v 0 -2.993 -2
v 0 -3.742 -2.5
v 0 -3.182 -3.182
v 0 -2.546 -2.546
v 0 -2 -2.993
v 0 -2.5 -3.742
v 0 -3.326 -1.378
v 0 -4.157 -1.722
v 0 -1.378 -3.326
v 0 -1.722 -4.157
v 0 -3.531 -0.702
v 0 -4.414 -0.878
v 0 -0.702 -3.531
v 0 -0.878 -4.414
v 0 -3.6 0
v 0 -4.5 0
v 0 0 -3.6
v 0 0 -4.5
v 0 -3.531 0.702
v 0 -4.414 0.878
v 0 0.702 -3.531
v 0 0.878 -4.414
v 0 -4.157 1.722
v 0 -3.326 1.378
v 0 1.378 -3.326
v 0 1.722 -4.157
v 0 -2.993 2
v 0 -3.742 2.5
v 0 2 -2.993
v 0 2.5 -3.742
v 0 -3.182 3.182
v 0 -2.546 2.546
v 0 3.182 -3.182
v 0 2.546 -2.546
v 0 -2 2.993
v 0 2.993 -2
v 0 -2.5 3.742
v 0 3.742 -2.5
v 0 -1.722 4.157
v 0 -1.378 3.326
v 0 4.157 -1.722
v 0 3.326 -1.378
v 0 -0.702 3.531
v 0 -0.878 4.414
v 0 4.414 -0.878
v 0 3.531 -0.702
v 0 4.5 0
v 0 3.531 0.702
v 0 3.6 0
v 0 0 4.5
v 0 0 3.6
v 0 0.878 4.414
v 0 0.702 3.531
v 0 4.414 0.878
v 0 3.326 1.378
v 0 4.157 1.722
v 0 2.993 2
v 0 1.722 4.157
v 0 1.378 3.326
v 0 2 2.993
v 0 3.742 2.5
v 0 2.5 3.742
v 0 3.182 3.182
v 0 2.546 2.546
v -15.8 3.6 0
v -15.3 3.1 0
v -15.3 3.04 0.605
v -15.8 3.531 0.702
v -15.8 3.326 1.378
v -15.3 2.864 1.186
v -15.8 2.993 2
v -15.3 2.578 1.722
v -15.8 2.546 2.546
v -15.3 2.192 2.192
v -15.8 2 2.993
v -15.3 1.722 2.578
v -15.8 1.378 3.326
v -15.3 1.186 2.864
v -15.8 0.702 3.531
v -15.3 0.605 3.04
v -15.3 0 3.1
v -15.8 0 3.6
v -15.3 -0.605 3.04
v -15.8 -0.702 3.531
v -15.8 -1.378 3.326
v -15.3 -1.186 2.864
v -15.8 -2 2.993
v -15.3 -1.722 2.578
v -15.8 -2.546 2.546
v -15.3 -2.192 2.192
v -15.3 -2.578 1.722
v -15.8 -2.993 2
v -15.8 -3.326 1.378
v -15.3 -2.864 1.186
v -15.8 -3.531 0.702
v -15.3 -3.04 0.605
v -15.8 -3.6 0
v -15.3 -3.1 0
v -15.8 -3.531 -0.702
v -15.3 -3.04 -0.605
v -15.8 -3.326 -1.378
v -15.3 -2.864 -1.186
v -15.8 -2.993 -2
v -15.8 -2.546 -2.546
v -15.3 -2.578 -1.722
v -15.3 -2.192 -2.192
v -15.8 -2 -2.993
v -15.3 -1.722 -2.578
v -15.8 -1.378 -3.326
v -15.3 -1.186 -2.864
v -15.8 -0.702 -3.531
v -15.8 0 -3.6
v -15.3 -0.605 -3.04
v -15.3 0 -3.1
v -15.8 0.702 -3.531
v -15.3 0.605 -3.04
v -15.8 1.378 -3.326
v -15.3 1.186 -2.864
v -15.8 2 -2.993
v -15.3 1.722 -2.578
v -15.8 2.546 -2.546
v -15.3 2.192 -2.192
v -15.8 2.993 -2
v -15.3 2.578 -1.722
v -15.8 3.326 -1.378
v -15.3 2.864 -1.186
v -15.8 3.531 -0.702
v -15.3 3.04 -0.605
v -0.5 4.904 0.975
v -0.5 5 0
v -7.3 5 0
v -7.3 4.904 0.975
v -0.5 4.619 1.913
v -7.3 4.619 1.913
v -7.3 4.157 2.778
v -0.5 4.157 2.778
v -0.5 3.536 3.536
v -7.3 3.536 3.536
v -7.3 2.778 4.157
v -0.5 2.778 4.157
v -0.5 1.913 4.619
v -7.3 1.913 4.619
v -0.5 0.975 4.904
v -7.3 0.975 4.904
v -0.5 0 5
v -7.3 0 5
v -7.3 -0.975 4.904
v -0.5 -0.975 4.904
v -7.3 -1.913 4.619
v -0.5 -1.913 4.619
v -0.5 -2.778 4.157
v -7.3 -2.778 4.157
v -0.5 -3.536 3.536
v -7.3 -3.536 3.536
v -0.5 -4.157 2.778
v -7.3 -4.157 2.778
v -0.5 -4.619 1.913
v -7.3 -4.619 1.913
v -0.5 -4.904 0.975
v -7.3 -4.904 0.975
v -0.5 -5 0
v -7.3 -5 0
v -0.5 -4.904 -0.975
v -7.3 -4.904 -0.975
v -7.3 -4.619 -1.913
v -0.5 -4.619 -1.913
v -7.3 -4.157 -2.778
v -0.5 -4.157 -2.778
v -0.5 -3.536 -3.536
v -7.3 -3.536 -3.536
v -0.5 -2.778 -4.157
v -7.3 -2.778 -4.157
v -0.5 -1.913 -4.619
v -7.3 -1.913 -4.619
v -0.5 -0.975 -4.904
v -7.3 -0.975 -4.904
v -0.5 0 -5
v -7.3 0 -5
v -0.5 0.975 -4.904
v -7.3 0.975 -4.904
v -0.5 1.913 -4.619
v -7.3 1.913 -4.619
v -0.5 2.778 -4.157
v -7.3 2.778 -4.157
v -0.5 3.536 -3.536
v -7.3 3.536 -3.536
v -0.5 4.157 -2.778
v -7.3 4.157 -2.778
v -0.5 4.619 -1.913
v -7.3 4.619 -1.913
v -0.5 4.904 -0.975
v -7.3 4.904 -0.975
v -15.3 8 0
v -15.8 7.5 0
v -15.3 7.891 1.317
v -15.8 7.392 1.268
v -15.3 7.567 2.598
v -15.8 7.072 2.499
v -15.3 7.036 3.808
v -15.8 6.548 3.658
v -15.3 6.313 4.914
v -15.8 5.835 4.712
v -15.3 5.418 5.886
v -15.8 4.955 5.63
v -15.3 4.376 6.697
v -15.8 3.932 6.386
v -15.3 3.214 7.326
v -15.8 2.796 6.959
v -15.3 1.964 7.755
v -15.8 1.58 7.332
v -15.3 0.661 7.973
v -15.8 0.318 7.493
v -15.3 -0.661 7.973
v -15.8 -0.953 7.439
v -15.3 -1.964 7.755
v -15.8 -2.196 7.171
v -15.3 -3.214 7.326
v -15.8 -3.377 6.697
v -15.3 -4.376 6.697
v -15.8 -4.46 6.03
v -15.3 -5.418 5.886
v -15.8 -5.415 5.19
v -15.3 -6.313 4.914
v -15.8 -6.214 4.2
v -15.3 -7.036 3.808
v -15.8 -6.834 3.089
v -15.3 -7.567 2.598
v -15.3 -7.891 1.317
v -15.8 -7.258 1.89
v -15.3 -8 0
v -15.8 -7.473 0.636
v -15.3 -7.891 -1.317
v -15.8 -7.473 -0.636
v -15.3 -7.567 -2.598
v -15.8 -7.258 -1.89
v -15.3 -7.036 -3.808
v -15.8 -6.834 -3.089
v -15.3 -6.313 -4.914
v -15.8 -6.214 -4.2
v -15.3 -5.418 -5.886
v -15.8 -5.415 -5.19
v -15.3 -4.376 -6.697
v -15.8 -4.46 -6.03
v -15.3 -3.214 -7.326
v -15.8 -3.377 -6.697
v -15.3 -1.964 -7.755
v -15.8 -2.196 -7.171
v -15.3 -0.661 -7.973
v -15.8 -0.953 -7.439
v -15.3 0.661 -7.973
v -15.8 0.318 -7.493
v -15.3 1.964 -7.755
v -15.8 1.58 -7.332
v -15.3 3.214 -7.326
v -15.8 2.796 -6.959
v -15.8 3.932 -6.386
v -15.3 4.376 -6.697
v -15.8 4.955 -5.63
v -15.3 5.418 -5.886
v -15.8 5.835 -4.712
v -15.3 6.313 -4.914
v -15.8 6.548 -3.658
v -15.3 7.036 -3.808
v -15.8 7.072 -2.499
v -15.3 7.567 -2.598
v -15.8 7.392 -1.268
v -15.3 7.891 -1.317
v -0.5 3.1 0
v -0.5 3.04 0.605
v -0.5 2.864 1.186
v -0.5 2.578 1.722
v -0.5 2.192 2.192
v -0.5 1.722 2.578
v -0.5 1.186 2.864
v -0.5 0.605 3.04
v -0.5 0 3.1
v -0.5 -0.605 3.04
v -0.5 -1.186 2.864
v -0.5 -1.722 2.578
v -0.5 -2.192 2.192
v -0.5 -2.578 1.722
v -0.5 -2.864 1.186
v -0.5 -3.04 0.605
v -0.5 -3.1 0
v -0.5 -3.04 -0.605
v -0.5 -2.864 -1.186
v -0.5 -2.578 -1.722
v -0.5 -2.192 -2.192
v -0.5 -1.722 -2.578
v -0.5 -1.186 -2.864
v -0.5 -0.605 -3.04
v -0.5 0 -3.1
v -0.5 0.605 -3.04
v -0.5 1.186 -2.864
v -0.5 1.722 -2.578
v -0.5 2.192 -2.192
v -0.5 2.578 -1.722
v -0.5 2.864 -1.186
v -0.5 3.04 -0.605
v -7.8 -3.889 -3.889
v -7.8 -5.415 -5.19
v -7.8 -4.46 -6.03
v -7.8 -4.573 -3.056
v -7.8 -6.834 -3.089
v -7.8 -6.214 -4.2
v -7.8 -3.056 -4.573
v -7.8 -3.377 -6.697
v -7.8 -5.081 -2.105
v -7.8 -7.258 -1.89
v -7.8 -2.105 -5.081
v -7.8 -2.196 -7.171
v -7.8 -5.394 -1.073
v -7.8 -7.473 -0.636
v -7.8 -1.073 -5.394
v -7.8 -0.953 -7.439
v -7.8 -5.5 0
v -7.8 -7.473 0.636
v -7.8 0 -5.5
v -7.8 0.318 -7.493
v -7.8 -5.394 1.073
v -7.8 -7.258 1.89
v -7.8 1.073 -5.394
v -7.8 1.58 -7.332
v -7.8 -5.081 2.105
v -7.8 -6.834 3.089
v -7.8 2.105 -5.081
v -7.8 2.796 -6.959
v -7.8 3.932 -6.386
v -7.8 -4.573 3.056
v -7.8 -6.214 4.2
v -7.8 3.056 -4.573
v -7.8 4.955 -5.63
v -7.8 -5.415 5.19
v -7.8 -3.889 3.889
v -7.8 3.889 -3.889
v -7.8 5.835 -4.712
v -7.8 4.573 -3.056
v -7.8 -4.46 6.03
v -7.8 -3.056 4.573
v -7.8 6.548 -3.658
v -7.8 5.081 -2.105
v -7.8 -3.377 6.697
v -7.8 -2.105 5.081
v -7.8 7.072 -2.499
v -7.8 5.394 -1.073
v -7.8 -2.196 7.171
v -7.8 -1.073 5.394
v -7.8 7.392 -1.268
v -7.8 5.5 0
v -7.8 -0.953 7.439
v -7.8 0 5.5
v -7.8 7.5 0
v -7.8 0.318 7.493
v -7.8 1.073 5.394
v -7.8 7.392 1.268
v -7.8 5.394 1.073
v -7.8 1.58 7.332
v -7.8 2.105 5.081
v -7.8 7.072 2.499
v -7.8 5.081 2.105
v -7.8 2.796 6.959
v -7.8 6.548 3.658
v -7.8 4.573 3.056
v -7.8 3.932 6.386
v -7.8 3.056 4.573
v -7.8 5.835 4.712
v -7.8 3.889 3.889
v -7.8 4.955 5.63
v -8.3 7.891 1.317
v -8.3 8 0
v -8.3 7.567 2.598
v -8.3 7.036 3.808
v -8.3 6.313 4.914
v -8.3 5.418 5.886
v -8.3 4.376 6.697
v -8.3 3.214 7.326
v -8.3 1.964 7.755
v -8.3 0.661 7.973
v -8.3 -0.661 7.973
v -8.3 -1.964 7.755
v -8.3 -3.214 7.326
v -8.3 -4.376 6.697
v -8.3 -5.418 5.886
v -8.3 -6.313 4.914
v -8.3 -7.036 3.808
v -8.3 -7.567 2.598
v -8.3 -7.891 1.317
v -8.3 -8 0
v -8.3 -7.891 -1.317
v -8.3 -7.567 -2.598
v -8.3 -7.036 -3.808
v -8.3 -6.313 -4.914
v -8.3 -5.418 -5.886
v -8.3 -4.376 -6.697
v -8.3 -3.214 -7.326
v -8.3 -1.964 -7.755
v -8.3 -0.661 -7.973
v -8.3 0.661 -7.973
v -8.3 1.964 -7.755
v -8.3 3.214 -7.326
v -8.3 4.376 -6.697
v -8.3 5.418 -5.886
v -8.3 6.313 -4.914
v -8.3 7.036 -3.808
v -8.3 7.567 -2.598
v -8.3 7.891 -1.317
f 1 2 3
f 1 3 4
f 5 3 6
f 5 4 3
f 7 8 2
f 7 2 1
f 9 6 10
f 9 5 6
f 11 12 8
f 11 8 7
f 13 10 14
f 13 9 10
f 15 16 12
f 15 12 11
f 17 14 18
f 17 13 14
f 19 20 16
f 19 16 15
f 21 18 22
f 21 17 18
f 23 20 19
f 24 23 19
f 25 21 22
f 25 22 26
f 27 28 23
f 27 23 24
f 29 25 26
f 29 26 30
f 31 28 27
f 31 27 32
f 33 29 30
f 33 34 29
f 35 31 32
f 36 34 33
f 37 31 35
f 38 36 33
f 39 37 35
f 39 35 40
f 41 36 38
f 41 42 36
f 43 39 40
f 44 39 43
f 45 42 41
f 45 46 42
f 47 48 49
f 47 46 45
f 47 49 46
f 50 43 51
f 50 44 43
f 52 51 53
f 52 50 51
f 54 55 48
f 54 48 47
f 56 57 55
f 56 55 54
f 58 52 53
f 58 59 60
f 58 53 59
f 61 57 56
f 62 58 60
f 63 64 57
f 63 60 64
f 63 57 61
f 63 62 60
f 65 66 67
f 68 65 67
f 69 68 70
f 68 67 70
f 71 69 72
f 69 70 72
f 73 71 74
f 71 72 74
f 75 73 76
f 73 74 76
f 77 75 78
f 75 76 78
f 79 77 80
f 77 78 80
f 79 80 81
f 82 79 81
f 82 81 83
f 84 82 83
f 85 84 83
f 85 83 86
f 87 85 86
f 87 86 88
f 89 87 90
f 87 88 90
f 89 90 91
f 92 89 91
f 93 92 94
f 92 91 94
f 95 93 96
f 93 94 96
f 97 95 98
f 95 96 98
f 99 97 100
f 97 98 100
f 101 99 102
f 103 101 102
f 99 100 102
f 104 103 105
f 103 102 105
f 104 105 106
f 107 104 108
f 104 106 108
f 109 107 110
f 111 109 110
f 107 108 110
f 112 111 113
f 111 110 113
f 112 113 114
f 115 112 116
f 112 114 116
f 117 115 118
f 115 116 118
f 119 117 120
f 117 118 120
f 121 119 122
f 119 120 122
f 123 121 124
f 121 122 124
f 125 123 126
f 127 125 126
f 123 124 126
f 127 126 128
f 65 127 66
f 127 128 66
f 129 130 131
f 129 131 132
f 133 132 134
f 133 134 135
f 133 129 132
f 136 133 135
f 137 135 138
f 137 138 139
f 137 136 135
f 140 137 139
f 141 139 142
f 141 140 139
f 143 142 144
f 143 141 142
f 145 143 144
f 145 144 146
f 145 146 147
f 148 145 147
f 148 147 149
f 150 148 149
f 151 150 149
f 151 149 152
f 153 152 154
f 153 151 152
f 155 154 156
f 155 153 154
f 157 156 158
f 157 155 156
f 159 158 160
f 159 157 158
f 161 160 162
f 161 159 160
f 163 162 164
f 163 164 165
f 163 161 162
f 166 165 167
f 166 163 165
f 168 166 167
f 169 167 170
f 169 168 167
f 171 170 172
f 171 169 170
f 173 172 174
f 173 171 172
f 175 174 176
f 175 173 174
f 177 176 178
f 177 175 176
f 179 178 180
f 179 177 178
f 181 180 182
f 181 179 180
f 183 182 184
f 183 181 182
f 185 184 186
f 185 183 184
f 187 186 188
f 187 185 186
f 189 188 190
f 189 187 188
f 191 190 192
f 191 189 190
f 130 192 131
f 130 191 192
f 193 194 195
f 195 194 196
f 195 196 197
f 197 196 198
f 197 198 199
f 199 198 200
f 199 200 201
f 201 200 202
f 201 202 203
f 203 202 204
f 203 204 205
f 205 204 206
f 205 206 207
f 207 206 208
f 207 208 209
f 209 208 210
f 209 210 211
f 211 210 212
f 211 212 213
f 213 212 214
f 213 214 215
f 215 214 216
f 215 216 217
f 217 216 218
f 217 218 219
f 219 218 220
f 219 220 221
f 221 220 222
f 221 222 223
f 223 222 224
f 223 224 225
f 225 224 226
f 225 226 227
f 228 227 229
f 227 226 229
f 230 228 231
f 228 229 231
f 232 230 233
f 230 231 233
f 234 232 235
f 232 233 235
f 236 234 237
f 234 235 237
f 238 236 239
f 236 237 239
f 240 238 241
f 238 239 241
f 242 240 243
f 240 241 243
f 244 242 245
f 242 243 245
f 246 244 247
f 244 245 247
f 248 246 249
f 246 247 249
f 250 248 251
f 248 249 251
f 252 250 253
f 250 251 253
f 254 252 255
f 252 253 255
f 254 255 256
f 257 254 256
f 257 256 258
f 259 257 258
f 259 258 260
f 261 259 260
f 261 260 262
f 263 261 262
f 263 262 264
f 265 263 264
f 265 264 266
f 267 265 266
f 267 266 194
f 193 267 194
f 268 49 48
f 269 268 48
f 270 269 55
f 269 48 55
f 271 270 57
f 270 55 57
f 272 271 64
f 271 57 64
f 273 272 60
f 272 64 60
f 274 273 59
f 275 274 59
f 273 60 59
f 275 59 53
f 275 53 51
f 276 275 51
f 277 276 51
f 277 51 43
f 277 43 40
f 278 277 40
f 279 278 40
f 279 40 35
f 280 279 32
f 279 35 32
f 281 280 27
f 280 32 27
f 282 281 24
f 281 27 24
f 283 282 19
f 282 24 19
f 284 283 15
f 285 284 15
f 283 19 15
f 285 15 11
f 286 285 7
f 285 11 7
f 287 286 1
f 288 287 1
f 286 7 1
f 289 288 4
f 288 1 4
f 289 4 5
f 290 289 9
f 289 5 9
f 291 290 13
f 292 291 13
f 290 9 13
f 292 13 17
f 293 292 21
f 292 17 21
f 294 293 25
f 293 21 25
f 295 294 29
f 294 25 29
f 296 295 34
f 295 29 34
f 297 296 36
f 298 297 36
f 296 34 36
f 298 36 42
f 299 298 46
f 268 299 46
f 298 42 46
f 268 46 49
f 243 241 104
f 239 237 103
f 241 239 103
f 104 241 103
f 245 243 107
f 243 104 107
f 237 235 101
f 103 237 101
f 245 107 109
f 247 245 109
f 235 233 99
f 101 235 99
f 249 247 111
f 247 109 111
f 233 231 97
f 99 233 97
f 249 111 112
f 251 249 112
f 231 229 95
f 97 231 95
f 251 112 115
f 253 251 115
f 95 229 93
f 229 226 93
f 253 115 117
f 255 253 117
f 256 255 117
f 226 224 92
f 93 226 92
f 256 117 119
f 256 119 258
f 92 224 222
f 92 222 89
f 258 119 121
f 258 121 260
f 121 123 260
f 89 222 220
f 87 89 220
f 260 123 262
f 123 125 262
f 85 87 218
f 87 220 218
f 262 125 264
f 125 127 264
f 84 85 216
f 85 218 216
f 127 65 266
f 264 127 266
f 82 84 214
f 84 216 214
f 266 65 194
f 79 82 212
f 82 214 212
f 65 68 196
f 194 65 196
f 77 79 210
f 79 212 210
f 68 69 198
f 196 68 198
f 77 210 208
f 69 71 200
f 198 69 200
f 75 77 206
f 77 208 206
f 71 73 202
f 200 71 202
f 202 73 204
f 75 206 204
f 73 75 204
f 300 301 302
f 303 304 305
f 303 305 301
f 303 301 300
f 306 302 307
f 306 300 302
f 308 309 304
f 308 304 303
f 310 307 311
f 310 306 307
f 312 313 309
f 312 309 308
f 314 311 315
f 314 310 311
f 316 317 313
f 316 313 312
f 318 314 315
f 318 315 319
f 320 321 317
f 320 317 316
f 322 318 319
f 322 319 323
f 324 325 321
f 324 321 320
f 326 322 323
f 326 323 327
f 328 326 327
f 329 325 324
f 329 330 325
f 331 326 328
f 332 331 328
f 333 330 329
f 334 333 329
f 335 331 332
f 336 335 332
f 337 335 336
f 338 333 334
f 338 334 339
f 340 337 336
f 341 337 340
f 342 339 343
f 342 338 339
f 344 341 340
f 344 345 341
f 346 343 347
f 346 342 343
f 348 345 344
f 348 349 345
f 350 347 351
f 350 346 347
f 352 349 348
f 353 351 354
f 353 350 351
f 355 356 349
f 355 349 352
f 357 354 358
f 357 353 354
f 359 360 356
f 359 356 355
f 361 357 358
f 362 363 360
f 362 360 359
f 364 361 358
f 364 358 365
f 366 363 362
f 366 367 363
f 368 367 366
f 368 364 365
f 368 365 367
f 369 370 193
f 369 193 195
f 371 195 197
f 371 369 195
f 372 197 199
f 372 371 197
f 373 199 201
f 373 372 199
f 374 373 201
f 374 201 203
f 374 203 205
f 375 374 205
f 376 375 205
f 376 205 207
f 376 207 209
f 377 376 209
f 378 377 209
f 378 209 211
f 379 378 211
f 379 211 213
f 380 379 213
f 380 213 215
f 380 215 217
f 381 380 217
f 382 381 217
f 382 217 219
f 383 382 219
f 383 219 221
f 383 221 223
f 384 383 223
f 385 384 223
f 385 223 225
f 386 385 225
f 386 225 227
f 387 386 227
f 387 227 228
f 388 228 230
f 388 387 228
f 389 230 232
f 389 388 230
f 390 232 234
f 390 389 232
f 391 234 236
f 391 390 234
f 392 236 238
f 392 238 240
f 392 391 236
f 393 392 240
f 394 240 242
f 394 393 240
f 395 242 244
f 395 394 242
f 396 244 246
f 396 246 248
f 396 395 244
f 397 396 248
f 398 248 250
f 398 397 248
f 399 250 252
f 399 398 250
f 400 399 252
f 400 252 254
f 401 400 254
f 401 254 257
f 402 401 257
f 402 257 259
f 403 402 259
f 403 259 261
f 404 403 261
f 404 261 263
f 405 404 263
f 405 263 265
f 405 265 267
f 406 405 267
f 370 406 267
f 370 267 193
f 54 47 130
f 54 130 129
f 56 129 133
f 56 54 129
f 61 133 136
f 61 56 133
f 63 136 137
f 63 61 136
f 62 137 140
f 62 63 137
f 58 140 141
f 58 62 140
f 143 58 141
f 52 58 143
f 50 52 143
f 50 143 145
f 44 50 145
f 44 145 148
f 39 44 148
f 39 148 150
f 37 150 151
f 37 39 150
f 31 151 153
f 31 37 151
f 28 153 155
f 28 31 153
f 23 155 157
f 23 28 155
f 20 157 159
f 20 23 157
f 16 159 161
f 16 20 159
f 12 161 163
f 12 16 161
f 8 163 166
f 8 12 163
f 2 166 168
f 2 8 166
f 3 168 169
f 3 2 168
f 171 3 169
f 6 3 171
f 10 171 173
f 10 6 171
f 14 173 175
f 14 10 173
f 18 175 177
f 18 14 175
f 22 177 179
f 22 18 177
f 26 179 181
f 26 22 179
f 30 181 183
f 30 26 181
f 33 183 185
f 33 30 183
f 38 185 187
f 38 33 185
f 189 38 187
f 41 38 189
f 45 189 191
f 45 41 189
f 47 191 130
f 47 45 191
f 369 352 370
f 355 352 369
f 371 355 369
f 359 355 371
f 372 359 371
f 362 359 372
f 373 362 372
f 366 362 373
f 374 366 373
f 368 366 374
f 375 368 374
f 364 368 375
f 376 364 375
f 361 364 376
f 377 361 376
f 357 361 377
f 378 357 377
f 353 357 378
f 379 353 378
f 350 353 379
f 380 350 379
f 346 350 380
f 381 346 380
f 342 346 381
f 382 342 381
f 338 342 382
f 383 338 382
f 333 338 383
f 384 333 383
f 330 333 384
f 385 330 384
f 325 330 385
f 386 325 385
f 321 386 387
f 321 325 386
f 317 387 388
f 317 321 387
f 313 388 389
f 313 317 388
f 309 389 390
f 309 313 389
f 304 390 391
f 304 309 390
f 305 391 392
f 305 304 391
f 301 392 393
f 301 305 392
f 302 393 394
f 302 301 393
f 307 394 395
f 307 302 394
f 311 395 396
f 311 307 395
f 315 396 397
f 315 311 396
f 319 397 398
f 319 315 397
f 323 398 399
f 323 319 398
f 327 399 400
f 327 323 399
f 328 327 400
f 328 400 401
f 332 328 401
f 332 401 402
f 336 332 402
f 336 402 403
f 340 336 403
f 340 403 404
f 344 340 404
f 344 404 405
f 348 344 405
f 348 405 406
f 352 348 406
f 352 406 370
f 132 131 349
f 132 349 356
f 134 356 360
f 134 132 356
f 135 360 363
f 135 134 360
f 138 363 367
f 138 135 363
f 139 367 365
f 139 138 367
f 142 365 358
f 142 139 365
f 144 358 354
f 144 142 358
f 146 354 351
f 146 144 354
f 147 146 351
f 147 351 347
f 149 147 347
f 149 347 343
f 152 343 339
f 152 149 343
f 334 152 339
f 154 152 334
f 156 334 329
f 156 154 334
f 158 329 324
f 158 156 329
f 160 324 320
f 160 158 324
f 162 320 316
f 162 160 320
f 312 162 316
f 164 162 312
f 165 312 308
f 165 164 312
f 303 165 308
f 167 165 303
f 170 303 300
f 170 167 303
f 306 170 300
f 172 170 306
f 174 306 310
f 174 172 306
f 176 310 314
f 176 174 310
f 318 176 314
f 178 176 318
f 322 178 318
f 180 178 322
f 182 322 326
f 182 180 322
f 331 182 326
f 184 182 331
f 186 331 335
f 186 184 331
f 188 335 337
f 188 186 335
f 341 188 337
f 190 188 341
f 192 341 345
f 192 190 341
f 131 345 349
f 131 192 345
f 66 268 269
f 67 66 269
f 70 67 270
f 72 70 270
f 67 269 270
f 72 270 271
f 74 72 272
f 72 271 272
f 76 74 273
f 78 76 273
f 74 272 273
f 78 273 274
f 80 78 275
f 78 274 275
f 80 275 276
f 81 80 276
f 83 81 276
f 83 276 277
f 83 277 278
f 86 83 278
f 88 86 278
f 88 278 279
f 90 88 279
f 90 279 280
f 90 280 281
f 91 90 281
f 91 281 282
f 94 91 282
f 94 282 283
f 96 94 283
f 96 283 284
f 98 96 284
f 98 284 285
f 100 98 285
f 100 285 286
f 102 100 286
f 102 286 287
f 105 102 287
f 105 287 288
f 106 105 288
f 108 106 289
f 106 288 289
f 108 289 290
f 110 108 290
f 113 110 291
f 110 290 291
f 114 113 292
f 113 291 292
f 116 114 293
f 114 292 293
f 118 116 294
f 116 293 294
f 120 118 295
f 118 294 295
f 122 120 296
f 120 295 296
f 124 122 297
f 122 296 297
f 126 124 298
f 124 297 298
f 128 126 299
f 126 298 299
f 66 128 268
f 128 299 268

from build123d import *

# Parameters (mm, degrees)
F0_R     = 8
F1_DEPTH = 15.8
F2_R     = 8
F2_R_2   = 5
F3_DEPTH = 7.8
F4_R     = 3.1
F5_DEPTH = 25
F6_SIZE  = 0.5


with BuildPart() as f1:
    # F0 (on Right) → F1 (new body)
    with BuildSketch(Plane.YZ):
        Circle(F0_R)
    extrude(amount=-F1_DEPTH)

    # F2 (on face) → F3 (cut)
    with BuildSketch(Plane.YZ):
        Circle(F2_R)
        Circle(F2_R_2, mode=Mode.SUBTRACT)
    extrude(amount=-F3_DEPTH, mode=Mode.SUBTRACT)

    # F4 (on face) → F5 (cut)
    with BuildSketch(Plane.YZ):
        Circle(F4_R)
    extrude(amount=-F5_DEPTH, mode=Mode.SUBTRACT)

    # F6
    f6_edges = [f1.edges().sort_by_distance(p)[0] for p in [
        (0, -3.1, 0),
        (-15.8, -3.1, 0),
        (0, -5, 0),
        (-7.8, -5, 0),
        (-7.8, -8, 0),
        (-15.8, -8, 0),
    ]]
    chamfer(f6_edges, length=F6_SIZE)


solid = f1.part
